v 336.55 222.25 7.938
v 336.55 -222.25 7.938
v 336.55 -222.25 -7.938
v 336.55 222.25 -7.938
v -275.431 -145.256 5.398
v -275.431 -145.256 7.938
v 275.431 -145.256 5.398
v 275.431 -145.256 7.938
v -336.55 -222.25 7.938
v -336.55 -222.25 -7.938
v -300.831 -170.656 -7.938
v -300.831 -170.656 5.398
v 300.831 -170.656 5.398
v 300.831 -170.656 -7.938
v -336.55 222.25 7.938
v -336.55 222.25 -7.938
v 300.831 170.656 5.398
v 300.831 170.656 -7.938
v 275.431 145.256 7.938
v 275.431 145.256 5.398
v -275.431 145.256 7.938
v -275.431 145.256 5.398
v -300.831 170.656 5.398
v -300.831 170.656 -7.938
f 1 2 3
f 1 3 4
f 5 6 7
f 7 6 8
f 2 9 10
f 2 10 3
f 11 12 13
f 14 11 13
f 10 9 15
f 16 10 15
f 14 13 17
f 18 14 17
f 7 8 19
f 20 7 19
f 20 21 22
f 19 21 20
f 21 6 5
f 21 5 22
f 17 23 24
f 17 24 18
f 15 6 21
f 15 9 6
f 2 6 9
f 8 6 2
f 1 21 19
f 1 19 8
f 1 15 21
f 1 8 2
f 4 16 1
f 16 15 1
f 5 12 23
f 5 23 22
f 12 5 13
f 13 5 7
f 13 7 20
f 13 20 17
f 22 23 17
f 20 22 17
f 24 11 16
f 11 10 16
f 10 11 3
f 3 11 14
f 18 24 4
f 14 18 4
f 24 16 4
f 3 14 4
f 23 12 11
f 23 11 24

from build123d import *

# Parameters (mm, degrees)
SKETCH1_W               = 673.1
SKETCH1_H               = 444.5
BOSS_EXTRUDE1_DEPTH     = 7.9375
SKETCH2_W               = 601.6625
SKETCH2_H               = 341.3125
CUT_EXTRUDE1_DEPTH      = 1
CUT_EXTRUDE1_DEPTH_BACK = 16.875
SKETCH8_W               = 601.6625
SKETCH8_H               = 341.3125
SKETCH8_W_2             = 550.8625
SKETCH8_H_2             = 290.5125
BOSS_EXTRUDE3_DEPTH     = 2.54


with BuildPart() as part:
    # Sketch1 → Boss-Extrude1 (new body, symmetric)
    with BuildSketch(Plane.XY):
        Rectangle(SKETCH1_W, SKETCH1_H)
    extrude(amount=BOSS_EXTRUDE1_DEPTH, both=True)

    # Sketch2 → Cut-Extrude1 (cut, two sides)
    with BuildSketch(Plane.XY.offset(7.9375)) as cut_extrude1_sk:
        Rectangle(SKETCH2_W, SKETCH2_H)
    extrude(amount=CUT_EXTRUDE1_DEPTH, mode=Mode.SUBTRACT)
    extrude(cut_extrude1_sk.sketch, amount=-CUT_EXTRUDE1_DEPTH_BACK, mode=Mode.SUBTRACT)

    # Sketch8 → Boss-Extrude3 (add)
    with BuildSketch(Plane.XY.offset(7.9375)):
        Rectangle(SKETCH8_W, SKETCH8_H)
        Rectangle(SKETCH8_W_2, SKETCH8_H_2, mode=Mode.SUBTRACT)
    extrude(amount=-BOSS_EXTRUDE3_DEPTH)


solid = part.part
